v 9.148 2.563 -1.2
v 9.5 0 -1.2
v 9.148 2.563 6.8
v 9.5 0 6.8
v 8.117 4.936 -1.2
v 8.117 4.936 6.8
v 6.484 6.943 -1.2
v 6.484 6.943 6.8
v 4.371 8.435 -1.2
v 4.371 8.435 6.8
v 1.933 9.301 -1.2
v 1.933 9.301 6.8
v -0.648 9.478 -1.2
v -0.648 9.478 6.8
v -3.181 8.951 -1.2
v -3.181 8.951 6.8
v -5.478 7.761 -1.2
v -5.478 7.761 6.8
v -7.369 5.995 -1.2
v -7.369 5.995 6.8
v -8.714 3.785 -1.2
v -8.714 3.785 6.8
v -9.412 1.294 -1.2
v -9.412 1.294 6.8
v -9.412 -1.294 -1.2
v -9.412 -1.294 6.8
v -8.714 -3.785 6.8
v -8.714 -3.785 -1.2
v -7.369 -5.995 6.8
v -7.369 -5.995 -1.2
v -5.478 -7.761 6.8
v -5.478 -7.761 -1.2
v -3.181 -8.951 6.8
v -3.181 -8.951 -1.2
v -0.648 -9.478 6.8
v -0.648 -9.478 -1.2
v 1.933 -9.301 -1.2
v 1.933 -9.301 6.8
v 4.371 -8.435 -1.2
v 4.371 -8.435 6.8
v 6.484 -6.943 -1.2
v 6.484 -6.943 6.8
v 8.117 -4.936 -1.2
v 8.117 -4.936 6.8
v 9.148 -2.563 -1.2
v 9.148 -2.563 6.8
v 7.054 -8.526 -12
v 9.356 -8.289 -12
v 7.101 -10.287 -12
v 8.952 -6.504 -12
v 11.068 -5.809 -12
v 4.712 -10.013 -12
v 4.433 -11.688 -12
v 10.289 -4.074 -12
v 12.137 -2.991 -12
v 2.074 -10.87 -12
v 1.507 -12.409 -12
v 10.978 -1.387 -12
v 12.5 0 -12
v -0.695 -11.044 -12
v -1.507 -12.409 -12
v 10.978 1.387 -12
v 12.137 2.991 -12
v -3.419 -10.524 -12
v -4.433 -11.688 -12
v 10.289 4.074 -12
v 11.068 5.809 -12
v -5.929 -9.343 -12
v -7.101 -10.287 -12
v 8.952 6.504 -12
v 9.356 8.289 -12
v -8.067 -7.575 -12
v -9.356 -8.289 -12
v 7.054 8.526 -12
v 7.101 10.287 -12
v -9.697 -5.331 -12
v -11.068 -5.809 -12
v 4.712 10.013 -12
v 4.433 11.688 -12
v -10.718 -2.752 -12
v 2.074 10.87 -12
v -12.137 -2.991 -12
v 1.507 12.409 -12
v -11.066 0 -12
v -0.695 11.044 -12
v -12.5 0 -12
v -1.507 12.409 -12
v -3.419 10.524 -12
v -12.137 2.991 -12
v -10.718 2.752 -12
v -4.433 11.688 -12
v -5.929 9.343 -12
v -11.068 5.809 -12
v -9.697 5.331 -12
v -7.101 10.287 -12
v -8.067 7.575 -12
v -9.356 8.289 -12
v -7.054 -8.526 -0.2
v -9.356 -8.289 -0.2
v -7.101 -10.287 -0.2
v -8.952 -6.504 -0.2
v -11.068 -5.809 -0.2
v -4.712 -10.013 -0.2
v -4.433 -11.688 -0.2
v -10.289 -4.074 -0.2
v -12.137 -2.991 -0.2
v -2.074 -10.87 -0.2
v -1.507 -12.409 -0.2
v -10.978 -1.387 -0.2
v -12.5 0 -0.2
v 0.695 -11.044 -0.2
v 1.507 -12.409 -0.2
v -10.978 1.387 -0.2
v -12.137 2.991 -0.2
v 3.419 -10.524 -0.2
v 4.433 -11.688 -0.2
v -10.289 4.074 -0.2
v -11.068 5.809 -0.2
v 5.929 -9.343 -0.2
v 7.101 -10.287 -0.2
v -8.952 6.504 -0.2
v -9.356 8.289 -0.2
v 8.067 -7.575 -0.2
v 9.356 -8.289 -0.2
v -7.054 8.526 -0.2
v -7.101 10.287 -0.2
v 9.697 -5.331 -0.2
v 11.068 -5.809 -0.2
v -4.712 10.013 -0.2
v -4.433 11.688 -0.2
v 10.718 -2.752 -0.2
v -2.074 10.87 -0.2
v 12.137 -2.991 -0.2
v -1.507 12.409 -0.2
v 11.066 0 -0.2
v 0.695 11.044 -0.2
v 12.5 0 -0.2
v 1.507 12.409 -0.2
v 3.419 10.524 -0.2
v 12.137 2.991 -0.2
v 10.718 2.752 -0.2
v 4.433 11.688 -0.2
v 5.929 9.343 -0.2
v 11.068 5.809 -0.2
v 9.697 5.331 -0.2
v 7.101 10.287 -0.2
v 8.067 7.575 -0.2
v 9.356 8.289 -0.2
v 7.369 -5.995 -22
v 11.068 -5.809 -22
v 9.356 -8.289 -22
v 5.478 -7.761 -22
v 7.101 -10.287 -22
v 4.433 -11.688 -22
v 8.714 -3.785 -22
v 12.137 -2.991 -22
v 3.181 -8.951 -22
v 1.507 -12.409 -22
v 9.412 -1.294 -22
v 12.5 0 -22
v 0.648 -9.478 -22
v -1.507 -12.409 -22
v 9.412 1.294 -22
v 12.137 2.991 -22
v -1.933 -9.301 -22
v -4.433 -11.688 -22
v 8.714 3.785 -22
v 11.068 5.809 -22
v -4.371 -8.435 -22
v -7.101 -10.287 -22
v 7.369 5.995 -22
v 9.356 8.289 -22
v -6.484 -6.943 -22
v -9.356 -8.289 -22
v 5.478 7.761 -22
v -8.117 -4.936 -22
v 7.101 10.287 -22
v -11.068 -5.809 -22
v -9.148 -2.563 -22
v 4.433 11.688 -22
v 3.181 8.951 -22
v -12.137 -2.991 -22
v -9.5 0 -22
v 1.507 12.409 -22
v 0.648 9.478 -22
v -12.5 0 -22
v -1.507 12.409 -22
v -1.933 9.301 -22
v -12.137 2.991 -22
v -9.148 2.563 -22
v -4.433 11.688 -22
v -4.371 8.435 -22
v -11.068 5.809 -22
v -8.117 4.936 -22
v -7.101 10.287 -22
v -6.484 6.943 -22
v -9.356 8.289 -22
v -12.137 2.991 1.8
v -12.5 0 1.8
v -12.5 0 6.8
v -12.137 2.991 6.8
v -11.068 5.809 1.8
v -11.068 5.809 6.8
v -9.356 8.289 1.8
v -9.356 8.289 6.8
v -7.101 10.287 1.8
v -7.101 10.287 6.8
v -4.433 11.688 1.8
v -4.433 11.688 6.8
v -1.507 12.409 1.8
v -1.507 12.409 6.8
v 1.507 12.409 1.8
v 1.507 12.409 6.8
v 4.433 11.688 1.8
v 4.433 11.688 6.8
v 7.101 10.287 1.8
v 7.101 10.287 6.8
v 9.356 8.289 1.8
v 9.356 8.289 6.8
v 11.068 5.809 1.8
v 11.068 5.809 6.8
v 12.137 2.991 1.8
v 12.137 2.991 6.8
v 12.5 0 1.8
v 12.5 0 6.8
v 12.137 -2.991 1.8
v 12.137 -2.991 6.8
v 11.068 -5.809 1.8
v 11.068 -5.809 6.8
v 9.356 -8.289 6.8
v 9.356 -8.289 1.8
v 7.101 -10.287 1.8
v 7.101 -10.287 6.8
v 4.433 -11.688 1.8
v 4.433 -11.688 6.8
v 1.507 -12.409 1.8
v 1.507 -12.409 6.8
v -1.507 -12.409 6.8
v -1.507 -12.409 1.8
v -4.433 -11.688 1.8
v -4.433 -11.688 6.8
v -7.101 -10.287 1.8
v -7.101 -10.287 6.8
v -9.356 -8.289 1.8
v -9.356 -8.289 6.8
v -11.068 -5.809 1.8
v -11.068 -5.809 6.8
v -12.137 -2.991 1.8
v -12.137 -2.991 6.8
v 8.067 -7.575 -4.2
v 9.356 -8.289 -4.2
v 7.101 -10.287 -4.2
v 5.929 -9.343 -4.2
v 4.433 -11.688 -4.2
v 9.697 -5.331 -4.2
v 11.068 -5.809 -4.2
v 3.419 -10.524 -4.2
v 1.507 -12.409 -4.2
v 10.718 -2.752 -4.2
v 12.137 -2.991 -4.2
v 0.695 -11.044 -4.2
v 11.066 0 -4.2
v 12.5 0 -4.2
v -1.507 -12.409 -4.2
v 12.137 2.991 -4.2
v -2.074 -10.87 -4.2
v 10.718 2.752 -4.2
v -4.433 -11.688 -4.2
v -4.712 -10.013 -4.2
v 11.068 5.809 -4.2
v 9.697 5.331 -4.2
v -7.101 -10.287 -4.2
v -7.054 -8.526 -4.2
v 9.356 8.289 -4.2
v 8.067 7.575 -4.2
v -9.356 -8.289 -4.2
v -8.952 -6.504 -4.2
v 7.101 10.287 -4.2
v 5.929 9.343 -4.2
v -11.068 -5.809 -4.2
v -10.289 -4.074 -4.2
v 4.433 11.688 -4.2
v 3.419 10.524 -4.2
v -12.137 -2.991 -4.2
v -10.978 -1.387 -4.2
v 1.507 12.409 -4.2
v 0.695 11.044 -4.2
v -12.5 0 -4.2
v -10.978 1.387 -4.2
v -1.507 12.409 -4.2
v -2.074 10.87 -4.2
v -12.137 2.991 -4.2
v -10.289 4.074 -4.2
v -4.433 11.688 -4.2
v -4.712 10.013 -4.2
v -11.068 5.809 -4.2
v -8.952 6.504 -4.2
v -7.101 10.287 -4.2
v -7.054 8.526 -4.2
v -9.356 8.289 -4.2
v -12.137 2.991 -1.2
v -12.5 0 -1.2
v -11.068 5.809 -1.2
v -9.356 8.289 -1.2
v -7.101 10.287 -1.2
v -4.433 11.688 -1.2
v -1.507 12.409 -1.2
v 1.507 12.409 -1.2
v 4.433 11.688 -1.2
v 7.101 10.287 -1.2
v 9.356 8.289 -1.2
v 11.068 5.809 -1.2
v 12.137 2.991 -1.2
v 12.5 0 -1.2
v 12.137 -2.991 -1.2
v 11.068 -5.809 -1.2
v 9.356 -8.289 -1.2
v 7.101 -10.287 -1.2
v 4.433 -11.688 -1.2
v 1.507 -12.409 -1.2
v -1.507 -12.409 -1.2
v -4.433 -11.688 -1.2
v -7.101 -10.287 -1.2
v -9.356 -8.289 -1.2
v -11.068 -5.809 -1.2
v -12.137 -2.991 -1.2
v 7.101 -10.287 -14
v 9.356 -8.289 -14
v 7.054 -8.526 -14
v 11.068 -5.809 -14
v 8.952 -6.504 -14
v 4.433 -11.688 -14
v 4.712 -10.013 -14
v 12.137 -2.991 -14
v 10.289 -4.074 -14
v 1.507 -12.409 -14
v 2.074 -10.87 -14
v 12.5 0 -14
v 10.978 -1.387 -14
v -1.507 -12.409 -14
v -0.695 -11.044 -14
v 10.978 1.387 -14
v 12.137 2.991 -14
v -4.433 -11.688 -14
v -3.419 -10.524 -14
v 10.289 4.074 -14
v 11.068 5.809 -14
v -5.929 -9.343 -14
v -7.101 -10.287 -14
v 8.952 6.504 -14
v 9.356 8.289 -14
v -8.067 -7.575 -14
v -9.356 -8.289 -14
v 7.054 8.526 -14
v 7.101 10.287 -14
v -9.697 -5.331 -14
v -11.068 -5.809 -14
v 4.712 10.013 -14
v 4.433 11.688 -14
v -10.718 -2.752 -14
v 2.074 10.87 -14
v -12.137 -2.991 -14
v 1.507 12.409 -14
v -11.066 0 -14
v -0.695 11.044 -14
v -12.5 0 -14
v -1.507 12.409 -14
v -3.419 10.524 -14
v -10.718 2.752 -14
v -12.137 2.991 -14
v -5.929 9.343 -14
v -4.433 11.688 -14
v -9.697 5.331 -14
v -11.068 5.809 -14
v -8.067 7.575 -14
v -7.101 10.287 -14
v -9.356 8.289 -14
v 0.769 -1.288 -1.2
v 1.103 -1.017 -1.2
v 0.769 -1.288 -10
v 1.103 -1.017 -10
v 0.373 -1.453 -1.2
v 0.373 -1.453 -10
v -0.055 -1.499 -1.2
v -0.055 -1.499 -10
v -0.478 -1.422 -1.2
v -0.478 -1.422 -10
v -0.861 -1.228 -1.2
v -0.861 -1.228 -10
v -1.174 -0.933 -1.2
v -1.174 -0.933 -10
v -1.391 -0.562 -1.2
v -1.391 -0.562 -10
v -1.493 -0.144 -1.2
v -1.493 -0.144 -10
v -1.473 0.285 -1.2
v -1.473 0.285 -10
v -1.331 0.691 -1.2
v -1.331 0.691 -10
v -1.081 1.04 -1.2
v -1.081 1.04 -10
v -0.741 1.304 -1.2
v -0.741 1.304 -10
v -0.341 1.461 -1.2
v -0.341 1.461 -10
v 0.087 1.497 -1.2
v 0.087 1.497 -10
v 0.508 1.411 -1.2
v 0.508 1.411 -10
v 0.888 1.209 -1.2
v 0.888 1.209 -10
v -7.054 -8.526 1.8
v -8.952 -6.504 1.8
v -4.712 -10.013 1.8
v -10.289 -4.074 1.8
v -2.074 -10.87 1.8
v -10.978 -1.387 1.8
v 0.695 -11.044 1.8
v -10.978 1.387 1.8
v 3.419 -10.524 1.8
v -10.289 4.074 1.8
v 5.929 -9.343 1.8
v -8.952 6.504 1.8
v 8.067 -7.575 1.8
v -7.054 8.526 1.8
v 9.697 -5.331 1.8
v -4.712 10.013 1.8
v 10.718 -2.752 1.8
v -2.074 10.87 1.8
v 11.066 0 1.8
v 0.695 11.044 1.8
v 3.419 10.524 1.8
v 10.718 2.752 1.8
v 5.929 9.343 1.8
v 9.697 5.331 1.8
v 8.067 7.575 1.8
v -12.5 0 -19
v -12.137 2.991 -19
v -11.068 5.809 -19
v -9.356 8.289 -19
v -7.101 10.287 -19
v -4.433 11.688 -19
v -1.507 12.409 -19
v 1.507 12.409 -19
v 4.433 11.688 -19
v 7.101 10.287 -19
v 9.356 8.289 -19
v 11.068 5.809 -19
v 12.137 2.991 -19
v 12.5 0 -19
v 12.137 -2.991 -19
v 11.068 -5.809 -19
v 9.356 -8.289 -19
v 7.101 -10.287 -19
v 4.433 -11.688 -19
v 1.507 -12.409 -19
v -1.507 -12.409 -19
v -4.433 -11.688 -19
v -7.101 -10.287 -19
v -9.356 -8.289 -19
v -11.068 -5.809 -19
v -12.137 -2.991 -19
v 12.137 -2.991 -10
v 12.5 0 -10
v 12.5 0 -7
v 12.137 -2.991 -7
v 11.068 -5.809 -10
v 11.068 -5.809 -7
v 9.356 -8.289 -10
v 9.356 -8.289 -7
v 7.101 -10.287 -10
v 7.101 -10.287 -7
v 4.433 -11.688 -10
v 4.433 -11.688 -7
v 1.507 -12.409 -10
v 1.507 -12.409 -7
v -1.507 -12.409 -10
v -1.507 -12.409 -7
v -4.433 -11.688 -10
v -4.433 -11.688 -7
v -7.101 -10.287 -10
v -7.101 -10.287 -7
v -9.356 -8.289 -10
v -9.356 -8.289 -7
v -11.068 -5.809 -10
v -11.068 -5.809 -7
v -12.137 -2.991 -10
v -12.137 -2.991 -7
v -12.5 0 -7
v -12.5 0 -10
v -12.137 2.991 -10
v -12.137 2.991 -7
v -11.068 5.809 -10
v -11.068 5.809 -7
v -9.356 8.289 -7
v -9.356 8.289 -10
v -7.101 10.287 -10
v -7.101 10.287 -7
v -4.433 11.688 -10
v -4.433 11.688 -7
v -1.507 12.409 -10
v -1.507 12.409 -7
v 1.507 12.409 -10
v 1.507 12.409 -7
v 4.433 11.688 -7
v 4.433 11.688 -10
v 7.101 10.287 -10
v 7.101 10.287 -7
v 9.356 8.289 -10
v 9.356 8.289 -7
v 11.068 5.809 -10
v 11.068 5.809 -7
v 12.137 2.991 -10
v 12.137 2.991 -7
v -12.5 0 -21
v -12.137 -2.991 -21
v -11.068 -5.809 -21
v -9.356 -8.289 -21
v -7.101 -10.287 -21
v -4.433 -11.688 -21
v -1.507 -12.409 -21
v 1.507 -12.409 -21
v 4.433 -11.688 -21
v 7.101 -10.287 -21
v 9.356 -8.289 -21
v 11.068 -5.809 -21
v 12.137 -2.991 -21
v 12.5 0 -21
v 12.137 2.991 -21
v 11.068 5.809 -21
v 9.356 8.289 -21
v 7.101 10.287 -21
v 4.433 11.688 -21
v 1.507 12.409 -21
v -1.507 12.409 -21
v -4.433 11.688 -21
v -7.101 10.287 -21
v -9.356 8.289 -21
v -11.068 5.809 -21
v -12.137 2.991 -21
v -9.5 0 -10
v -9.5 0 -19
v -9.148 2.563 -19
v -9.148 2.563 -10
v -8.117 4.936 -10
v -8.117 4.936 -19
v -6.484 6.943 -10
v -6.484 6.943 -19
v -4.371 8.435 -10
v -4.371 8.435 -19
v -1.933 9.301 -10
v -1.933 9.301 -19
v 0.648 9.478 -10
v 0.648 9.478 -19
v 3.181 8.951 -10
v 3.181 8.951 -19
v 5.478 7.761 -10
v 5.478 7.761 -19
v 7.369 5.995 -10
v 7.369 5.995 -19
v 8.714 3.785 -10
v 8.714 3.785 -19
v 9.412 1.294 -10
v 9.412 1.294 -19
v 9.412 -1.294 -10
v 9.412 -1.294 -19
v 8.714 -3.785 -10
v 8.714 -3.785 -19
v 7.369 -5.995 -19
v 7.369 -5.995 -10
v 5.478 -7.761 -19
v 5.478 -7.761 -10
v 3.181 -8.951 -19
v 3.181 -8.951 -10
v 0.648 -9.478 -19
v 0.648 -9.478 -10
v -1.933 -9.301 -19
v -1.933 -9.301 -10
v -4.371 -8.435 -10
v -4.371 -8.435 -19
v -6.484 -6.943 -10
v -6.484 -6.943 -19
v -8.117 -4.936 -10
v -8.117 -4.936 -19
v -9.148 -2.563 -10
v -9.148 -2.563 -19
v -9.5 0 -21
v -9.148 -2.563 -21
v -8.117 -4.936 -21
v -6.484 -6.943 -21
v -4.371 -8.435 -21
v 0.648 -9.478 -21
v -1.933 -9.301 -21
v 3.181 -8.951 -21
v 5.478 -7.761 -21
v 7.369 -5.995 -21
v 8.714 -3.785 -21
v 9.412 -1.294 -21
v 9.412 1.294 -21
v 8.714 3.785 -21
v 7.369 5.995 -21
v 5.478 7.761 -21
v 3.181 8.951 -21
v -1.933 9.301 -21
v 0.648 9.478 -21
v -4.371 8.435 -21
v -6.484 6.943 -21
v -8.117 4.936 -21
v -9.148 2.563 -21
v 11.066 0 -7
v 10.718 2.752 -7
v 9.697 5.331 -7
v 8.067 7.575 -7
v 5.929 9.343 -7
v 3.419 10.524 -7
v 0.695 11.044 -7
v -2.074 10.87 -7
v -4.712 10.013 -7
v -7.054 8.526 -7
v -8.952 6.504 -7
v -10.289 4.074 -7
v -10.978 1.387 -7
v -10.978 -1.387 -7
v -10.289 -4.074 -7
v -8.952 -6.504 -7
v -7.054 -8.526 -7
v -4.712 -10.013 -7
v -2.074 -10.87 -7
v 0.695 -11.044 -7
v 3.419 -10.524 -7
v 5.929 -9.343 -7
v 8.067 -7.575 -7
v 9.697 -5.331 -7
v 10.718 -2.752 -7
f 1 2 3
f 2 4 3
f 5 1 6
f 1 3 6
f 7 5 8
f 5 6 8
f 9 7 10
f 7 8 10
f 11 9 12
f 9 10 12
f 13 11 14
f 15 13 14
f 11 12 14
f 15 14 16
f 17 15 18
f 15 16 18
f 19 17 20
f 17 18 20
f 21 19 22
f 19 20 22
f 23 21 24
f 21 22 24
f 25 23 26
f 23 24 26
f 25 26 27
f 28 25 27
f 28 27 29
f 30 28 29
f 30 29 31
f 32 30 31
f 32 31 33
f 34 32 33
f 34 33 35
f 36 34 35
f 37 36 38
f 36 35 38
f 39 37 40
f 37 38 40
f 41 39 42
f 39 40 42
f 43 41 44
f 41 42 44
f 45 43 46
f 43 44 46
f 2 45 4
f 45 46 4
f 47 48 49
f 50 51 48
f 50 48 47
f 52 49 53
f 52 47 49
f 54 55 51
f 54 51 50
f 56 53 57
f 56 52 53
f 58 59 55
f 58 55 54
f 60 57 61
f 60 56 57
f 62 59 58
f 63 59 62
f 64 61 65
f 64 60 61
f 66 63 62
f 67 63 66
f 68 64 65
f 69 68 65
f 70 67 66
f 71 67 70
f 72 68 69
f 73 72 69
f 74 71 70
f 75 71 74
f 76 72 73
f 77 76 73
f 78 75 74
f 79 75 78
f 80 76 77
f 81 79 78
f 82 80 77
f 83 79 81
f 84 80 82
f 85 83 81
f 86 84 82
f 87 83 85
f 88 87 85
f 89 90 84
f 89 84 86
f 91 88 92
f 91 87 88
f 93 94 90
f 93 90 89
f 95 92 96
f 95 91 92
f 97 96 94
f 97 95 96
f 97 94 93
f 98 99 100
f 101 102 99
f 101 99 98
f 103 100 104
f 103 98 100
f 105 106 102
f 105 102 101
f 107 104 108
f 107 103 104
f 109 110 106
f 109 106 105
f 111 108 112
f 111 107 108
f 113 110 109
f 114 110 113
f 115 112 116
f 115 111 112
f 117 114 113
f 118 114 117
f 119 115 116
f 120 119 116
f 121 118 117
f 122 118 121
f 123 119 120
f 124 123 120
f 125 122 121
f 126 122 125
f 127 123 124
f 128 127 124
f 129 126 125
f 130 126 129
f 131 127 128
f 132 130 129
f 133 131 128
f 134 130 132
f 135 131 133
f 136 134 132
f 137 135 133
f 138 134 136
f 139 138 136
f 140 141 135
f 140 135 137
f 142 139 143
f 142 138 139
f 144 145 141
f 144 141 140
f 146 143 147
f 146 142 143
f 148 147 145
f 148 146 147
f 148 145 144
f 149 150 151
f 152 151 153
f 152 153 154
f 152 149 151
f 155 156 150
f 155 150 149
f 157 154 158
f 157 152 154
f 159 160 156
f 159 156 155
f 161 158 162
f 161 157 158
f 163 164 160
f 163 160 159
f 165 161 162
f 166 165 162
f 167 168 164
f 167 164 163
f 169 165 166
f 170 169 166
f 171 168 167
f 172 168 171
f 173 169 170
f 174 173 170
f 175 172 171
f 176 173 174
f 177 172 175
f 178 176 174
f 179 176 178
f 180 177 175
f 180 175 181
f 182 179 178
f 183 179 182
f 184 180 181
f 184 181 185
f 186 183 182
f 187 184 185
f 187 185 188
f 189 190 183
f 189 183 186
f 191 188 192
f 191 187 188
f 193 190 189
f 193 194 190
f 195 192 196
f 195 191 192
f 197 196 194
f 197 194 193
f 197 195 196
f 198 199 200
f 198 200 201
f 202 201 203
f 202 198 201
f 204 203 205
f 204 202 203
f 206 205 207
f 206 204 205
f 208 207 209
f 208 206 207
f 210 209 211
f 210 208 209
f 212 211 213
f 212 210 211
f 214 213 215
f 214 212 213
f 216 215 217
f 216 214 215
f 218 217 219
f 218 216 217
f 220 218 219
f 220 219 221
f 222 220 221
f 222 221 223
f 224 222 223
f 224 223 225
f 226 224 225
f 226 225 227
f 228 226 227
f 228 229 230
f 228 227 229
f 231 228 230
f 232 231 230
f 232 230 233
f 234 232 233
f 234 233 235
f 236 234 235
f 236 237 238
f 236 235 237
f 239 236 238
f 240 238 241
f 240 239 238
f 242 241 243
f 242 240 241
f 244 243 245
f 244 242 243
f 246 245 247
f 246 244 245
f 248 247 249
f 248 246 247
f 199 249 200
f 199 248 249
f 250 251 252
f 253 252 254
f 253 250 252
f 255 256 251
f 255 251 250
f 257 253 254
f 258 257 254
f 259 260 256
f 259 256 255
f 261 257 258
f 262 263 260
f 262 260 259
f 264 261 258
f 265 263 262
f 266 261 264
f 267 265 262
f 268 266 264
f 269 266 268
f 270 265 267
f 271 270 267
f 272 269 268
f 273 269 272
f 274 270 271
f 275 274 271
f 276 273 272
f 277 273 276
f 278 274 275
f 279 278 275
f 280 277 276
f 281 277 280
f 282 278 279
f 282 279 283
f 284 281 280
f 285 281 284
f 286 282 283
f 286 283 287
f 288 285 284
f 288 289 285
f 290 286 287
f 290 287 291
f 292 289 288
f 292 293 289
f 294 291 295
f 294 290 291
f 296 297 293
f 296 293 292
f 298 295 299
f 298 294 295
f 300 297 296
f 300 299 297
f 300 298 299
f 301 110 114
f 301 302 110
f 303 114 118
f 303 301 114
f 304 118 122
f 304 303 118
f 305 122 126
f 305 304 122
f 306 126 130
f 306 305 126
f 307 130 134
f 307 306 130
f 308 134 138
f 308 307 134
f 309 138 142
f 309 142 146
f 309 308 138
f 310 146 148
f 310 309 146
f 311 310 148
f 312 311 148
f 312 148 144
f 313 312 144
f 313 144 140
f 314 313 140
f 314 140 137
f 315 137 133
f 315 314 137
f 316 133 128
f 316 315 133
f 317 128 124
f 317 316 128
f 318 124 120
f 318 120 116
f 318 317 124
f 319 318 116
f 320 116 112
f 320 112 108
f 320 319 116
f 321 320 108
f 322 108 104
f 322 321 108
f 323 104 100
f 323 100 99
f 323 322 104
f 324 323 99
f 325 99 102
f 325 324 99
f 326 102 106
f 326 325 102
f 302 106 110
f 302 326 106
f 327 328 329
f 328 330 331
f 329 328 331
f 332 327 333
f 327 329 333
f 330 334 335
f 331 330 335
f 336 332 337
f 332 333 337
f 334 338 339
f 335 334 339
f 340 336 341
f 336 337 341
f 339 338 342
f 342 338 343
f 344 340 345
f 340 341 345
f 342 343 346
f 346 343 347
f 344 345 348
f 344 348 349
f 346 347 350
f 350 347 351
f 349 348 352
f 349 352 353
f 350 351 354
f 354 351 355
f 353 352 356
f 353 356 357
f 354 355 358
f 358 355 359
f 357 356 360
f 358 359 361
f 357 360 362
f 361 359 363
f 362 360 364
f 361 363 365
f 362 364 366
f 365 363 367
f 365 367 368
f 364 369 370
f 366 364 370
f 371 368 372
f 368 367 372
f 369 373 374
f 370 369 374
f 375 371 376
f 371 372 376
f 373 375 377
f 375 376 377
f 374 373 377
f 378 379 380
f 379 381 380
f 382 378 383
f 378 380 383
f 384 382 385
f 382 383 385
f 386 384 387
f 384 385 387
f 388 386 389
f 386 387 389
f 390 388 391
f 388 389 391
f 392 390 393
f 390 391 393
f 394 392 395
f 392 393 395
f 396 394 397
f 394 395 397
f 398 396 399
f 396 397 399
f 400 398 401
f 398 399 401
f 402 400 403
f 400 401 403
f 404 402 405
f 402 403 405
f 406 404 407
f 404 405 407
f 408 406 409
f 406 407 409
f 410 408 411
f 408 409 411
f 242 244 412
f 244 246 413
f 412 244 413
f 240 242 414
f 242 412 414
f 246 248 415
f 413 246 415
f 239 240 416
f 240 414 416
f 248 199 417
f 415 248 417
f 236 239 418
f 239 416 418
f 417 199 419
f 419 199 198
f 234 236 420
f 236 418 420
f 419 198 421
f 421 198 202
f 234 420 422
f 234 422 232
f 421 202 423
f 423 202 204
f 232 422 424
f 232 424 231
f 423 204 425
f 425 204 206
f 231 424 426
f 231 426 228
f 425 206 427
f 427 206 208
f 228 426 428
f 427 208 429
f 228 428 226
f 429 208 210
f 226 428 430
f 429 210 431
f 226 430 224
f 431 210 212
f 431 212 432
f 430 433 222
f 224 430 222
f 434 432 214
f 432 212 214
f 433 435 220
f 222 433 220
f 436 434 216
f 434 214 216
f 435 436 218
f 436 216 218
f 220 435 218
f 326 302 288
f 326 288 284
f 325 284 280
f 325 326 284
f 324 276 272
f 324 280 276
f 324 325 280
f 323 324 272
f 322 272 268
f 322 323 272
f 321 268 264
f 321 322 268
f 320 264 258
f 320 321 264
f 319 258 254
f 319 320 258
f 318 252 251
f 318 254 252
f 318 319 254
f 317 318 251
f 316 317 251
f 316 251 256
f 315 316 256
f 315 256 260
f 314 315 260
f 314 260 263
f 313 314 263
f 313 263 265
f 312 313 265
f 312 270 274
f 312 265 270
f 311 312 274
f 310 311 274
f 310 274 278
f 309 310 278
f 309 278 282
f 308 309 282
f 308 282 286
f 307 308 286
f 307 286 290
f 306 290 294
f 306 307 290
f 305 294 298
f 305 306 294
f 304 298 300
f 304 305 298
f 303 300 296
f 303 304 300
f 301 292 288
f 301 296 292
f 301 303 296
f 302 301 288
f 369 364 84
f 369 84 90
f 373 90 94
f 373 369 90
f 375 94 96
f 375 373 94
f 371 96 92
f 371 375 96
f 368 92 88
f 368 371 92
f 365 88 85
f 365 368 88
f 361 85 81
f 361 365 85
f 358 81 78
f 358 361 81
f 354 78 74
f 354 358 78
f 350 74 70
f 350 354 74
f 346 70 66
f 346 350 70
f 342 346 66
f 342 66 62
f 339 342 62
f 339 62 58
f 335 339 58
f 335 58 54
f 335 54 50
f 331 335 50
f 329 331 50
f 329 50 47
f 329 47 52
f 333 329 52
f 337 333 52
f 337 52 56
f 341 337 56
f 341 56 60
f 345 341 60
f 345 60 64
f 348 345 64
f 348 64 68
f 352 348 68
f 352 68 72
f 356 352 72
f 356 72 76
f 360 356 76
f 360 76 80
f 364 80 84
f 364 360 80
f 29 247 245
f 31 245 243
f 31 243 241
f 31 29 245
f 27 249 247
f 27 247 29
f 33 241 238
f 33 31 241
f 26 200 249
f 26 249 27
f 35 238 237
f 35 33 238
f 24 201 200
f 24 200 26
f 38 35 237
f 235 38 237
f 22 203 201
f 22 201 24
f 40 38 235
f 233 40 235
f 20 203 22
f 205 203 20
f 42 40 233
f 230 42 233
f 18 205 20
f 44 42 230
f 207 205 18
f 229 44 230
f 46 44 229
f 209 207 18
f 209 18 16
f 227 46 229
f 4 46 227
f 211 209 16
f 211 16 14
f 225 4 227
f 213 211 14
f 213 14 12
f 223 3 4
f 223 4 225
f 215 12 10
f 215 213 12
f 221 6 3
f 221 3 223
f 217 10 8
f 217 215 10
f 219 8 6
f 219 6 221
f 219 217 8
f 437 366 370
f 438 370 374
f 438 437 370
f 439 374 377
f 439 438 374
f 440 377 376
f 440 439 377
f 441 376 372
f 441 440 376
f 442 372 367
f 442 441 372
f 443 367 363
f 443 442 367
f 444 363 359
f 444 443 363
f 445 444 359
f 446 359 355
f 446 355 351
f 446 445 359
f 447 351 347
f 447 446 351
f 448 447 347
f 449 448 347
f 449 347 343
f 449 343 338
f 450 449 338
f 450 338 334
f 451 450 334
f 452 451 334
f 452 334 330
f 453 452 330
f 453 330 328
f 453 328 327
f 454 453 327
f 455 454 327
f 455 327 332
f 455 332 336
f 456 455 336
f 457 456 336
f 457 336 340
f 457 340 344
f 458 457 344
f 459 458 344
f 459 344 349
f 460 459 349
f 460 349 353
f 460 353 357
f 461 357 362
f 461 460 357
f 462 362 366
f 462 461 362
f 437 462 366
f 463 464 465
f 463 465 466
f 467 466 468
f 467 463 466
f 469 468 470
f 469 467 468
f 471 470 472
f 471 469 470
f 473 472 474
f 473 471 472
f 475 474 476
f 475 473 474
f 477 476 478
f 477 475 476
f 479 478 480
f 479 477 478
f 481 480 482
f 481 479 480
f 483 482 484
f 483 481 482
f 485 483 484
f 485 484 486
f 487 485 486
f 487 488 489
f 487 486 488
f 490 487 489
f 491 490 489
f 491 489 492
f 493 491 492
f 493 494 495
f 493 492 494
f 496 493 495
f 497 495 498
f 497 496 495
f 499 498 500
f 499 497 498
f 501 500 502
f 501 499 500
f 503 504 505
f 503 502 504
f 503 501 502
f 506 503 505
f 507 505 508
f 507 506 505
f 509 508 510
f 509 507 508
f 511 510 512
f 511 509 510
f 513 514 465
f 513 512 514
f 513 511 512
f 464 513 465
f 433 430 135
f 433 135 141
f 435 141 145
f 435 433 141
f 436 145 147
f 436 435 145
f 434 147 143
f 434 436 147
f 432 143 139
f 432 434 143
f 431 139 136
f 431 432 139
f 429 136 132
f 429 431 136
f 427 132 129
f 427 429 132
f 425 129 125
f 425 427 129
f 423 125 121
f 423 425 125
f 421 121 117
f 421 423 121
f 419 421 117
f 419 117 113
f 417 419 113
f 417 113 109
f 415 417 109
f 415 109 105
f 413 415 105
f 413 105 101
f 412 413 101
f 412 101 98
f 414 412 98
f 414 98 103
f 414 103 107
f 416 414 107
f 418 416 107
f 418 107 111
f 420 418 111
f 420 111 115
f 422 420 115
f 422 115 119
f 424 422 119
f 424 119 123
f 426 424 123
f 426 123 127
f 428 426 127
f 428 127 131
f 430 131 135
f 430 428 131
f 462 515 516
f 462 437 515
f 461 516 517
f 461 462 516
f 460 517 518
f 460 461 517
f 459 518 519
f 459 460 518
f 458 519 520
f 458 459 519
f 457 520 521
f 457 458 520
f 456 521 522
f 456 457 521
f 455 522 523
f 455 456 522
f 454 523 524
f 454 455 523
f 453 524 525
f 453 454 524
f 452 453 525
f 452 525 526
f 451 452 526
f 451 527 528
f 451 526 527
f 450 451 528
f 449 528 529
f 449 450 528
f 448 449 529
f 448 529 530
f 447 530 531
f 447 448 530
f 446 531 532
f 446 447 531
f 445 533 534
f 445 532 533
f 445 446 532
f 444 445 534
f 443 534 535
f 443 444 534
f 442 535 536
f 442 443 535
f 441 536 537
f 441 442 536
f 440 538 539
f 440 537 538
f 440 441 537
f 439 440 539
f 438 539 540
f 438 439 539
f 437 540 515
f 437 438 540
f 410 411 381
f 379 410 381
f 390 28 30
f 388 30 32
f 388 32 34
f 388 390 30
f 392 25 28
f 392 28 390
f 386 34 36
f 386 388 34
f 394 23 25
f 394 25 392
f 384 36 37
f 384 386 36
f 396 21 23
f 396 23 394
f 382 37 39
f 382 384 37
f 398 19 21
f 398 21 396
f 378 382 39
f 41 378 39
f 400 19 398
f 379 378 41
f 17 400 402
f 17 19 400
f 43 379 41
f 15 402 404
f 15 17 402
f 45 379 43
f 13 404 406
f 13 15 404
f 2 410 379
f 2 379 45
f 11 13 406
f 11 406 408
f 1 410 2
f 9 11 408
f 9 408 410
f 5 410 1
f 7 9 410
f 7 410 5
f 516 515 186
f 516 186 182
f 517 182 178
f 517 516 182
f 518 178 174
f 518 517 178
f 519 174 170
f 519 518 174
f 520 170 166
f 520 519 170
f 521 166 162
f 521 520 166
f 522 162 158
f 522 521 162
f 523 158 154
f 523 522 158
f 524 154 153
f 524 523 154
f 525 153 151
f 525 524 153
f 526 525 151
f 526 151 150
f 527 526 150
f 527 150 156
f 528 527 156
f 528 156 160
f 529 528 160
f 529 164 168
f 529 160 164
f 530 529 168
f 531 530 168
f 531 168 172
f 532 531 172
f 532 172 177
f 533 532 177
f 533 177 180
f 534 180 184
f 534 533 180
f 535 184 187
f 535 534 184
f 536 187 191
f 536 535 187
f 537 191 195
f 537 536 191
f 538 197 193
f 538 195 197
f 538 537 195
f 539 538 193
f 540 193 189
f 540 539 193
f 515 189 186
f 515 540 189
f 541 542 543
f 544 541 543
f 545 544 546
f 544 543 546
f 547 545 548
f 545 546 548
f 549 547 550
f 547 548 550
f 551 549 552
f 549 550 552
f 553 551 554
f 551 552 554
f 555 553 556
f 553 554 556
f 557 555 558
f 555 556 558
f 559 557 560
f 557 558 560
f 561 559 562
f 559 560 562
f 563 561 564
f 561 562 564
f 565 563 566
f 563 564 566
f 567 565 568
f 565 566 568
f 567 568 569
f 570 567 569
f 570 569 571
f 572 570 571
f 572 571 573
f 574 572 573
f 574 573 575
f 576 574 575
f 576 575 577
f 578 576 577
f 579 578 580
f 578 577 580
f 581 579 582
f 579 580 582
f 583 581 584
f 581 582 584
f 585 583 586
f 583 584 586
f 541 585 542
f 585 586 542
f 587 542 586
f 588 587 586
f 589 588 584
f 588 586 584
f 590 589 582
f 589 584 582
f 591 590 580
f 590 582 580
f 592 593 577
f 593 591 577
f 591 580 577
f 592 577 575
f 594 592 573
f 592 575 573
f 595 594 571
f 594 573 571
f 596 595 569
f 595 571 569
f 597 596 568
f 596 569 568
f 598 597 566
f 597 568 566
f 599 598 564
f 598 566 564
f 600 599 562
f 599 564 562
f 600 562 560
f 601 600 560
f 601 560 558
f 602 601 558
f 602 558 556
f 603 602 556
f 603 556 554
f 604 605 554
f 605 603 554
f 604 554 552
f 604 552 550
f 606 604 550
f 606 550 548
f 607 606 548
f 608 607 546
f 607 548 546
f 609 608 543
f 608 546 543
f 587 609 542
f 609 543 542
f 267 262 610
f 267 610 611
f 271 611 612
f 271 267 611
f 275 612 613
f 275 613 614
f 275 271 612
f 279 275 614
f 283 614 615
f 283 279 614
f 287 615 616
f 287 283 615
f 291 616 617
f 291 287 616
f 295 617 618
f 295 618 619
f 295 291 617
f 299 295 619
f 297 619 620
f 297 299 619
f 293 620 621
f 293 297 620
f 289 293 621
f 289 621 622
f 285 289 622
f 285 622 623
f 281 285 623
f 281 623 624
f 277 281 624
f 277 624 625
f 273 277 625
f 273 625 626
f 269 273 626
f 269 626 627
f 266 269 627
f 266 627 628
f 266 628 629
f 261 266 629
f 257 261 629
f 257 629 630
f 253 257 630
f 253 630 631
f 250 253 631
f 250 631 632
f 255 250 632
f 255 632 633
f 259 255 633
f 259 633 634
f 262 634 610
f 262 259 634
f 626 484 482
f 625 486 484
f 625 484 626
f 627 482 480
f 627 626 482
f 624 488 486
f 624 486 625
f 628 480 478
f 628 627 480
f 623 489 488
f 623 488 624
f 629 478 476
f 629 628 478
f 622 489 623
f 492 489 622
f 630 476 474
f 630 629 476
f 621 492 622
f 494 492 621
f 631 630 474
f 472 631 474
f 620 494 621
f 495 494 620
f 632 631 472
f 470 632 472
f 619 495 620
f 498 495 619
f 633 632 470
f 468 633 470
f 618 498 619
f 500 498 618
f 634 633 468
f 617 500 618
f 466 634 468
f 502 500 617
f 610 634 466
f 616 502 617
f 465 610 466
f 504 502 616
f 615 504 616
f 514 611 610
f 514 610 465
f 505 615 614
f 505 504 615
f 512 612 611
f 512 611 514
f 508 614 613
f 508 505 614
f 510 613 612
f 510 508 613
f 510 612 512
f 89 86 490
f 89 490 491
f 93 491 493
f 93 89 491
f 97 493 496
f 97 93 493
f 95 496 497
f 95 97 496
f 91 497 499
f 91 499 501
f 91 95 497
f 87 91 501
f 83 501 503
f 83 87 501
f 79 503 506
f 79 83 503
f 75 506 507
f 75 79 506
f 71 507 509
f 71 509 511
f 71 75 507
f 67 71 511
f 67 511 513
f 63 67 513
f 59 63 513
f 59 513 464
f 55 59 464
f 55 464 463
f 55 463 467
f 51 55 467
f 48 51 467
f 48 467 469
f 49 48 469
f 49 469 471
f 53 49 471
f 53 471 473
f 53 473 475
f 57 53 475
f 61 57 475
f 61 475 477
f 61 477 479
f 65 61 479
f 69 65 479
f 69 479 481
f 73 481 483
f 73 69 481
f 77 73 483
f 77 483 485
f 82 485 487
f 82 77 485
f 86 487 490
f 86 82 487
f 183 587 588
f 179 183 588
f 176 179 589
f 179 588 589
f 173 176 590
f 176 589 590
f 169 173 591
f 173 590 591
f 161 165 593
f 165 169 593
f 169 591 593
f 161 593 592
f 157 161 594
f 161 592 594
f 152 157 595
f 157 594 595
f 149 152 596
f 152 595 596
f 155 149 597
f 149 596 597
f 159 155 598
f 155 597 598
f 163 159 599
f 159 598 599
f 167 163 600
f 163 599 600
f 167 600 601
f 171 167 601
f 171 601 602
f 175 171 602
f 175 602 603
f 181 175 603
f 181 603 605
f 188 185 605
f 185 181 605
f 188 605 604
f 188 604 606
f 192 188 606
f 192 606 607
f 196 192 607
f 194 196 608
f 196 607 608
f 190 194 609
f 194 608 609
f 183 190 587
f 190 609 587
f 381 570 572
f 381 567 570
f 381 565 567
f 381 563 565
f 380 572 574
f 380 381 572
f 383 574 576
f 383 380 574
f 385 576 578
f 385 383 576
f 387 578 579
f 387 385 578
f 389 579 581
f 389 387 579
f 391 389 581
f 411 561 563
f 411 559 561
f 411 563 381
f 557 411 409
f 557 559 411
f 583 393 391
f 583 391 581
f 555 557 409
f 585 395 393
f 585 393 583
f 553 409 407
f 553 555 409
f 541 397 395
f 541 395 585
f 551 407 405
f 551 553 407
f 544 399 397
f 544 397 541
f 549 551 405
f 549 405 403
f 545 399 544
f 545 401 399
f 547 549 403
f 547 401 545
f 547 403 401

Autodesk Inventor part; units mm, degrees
ref_plane "YZ Plane" through (0, 0, 0) normal (1, 0, 0) x (0, 1, 0)
sketch "Sketch1" plane through (0, 0, 0) normal (0, 0, 1) x (1, 0, 0)
  circle A0 centre (0, 0) radius 0.5 projected
  circle A1 centre (0, 0) radius 8.1639
  point P0 (0, 0)
extrude "Extrusion1" add sketch "Sketch1" along normal blind 9.8
ref_plane "Work Plane1" through (0, 0, -10) normal (0, 0, 1) x (1, 0, 0)
sketch "Sketch2" plane through (0, 0, -10) normal (0, 0, 1) x (1, 0, 0)
  line L0 (5, 5) -> (-5, 5) projected
  arc A0 (-5, 5) -> (-6, 4) centre (-5, 4) ccw projected
  line L1 (-6, 4) -> (-6, -4) projected
  arc A1 (-6, -4) -> (-5, -5) centre (-5, -4) ccw projected
  line L2 (-5, -5) -> (5, -5) projected
  arc A2 (5, -5) -> (6, -4) centre (5, -4) ccw projected
  line L3 (6, -4) -> (6, 4) projected
  arc A3 (6, 4) -> (5, 5) centre (5, 4) ccw projected
  circle A4 centre (3.5, 2.5) radius 1.75 projected
  circle A5 centre (-3.5, -2.5) radius 1.75 projected
  circle A6 centre (4.5, 0) radius 0.625 projected
  circle A7 centre (-4.5, 0) radius 0.625 projected
  circle A8 centre (0, 0) radius 2 projected
  line L4 (0, 0) -> (5.8769, -4.8974)
  line L5 (5.8769, -4.8974) -> (7.0292, -5.8577)
  circle A9 centre (0, 0) radius 9.15
  circle A10 centre (0, 0) radius 8.1639 projected
  circle A11 centre (0, 0) radius 13.1
  line L6 (3.0438, -10.097) -> (-9.0477, 9.4736)
  line L7 (-6.9043, 6.0044) -> (-9.0477, 9.4736)
  line L8 (3.0438, -10.097) -> (-5, 4)
  line L9 (-5, 4) -> (-4.2491, 2.684)
  point P0 (0, 0)
  dimension "d3" = 26.2
  dimension "d2" = 1.5
  dimension "d4" = 18.3
extrude "Extrusion2" add sketch "Sketch2" against normal blind 9 contours A9 L8 L6 | A11
sketch "Sketch3" plane through (0, 0, -10) normal (0, 0, 1) x (1, 0, 0)
  arc A0 (0.8877, 1.2091) -> (1.103, -1.0166) centre (0, 0) ccw projected
  line L0 (0.8877, 1.2091) -> (1.103, -1.0166) projected
  circle A1 centre (0, 0) radius 13.1 projected
  circle A2 centre (0, 0) radius 9.15 projected
  circle A3 centre (0, 0) radius 8.1639 projected
  circle A4 centre (0, 0) radius 0.5 projected
  point P0 (0, 0)
extrude "Extrusion3" add sketch "Sketch3" along normal up to surface (19.8 mm away) contours A1 | A2 | A3
sketch "Sketch4" plane through (0, 0, 9.8) normal (0, 0, 1) x (1, 0, 0)
  circle A0 centre (0, 0) radius 13.1 projected
  circle A1 centre (0, 0) radius 0.5 projected
  point P0 (0, 0)
extrude "Extrusion4" add sketch "Sketch4" against normal blind 10 contours A1
sketch "Sketch5" plane through (0, 0, 9.8) normal (0, 0, 1) x (1, 0, 0)
  circle A0 centre (0, 0) radius 13.1 projected
  point P0 (0, 0)
extrude "Extrusion5" add sketch "Sketch5" against normal up to surface (9.8 mm away)
sketch "Sketch6" plane through (0, 0, -0.2) normal (0, 0, -1) x (-1, 0, 0)
  circle A0 centre (0, 0) radius 0.5 projected
  point P0 (0, 0)
extrude "Extrusion6" cut sketch "Sketch6" against normal up to surface (0.2 mm away)
sketch "Sketch8" plane through (0, 0, 9.8) normal (0, 0, 1) x (1, 0, 0)
  circle A0 centre (0, 0) radius 13.1 projected
  point P0 (0, 0)
extrude "Extrusion7" cut sketch "Sketch8" against normal blind 3
sketch "Sketch10" plane through (0, 0, -19) normal (0, 0, -1) x (-1, 0, 0)
  circle A0 centre (0, 0) radius 13.1 projected
  circle A1 centre (0, 0) radius 9.15 projected
  circle A2 centre (0, 0) radius 12.5
  line L0 (-12.5, 0) -> (-9.15, 0)
  circle A3 centre (0, 0) radius 9.15 projected
  line L1 (-9.15, 0) -> (-10.825, 0)
  circle A4 centre (0, 0) radius 10.825
  point P0 (0, 0)
  dimension "d18" = 25
extrude "Extrusion8" cut sketch "Sketch10" against normal up to surface (9 mm away)
extrude "Extrusion9" cut sketch "Sketch10" against normal through all contours A0
sketch "Sketch11" plane through (0, 0, -19) normal (0, 0, -1) x (-1, 0, 0)
  circle A0 centre (0, 0) radius 10.825 projected
  line L0 (-0.8877, 1.2091) -> (-1.103, -1.0166) projected
  arc A1 (-1.103, -1.0166) -> (-0.8877, 1.2091) centre (0, 0) ccw projected
  circle A2 centre (0, 0) radius 10.825 projected
  circle A3 centre (0, 0) radius 12.5 projected
  line L1 (-12.5, 0) -> (-9.5, 0)
  circle A4 centre (0, 0) radius 9.5
  point P0 (0, 0)
  dimension "d23" = 3
extrude "Extrusion10" add sketch "Sketch11" against normal up to surface (9 mm away) contours A0
sketch "Sketch12" plane through (0, 0, 6.8) normal (0, 0, 1) x (1, 0, 0)
  circle A0 centre (0, 0) radius 12.5 projected
  circle A1 centre (0, 0) radius 9.5 projected
  line L0 (0.8877, 1.2091) -> (1.103, -1.0166) projected
  arc A2 (0.8877, 1.2091) -> (1.103, -1.0166) centre (0, 0) ccw projected
  point P0 (0, 0)
extrude "Extrusion11" cut sketch "Sketch12" against normal blind 8 contours A1 | L0 A2
sketch "Sketch13" plane through (0, 0, -1.2) normal (0, 0, 1) x (1, 0, 0)
  line L0 (1.103, -1.0166) -> (0.8877, 1.2091) projected
  arc A0 (0.8877, 1.2091) -> (1.103, -1.0166) centre (0, 0) ccw projected
  circle A1 centre (0, 0) radius 9.5 projected
  circle A2 centre (0, 0) radius 11.0657
  circle A3 centre (0, 0) radius 9.5 projected
  circle A4 centre (0, 0) radius 12.5 projected
  point P0 (0, 0)
extrude "Extrusion12" cut sketch "Sketch13" against normal up to surface (8.8 mm away) contours A4
sketch "Sketch14" plane through (0, 0, -10) normal (0, 0, 1) x (1, 0, 0)
  circle A0 centre (0, 0) radius 11.0657 projected
  circle A1 centre (0, 0) radius 12.5 projected
  point P0 (0, 0)
extrude "Extrusion13" add sketch "Sketch14" along normal blind 3
sketch "Sketch15" plane through (0, 0, -1.2) normal (0, 0, -1) x (-1, 0, 0)
  circle A0 centre (0, 0) radius 12.5 projected
  circle A1 centre (0, 0) radius 11.0657 projected
  point P0 (0, 0)
extrude "Extrusion14" add sketch "Sketch15" along normal blind 3
ref_plane "Work Plane2" through (0, 0, -14) normal (0, 0, -1) x (-1, 0, 0)
ref_plane "Work Plane3" through (0, 0, 1.8) normal (0, 0, 1) x (1, 0, 0)
sketch "Sketch16" plane through (0, 0, -14) normal (0, 0, -1) x (-1, 0, 0)
  circle A0 centre (0, 0) radius 12.5 projected
  circle A1 centre (0, 0) radius 11.0657 projected
  point P0 (0, 0)
extrude "Extrusion15" cut sketch "Sketch16" against normal blind 2
sketch "Sketch17" plane through (0, 0, 1.8) normal (0, 0, 1) x (1, 0, 0)
  circle A0 centre (0, 0) radius 12.5 projected
  circle A1 centre (0, 0) radius 11.0657 projected
  point P0 (0, 0)
extrude "Extrusion16" cut sketch "Sketch17" against normal blind 2
sketch "Sketch18" plane through (0, 0, -19) normal (0, 0, -1) x (-1, 0, 0)
  circle A0 centre (0, 0) radius 9.5 projected
  circle A1 centre (0, 0) radius 12.5 projected
  point P0 (0, 0)
extrude "Extrusion17" add sketch "Sketch18" along normal blind 2
sketch "Sketch19" plane through (0, 0, -21) normal (0, 0, -1) x (-1, 0, 0)
  circle A0 centre (0, 0) radius 12.5 projected
  circle A1 centre (0, 0) radius 9.5 projected
  point P0 (0, 0)
extrude "Extrusion18" add sketch "Sketch19" along normal blind 1
properties part number "felga" material "Aluminum 6061"
